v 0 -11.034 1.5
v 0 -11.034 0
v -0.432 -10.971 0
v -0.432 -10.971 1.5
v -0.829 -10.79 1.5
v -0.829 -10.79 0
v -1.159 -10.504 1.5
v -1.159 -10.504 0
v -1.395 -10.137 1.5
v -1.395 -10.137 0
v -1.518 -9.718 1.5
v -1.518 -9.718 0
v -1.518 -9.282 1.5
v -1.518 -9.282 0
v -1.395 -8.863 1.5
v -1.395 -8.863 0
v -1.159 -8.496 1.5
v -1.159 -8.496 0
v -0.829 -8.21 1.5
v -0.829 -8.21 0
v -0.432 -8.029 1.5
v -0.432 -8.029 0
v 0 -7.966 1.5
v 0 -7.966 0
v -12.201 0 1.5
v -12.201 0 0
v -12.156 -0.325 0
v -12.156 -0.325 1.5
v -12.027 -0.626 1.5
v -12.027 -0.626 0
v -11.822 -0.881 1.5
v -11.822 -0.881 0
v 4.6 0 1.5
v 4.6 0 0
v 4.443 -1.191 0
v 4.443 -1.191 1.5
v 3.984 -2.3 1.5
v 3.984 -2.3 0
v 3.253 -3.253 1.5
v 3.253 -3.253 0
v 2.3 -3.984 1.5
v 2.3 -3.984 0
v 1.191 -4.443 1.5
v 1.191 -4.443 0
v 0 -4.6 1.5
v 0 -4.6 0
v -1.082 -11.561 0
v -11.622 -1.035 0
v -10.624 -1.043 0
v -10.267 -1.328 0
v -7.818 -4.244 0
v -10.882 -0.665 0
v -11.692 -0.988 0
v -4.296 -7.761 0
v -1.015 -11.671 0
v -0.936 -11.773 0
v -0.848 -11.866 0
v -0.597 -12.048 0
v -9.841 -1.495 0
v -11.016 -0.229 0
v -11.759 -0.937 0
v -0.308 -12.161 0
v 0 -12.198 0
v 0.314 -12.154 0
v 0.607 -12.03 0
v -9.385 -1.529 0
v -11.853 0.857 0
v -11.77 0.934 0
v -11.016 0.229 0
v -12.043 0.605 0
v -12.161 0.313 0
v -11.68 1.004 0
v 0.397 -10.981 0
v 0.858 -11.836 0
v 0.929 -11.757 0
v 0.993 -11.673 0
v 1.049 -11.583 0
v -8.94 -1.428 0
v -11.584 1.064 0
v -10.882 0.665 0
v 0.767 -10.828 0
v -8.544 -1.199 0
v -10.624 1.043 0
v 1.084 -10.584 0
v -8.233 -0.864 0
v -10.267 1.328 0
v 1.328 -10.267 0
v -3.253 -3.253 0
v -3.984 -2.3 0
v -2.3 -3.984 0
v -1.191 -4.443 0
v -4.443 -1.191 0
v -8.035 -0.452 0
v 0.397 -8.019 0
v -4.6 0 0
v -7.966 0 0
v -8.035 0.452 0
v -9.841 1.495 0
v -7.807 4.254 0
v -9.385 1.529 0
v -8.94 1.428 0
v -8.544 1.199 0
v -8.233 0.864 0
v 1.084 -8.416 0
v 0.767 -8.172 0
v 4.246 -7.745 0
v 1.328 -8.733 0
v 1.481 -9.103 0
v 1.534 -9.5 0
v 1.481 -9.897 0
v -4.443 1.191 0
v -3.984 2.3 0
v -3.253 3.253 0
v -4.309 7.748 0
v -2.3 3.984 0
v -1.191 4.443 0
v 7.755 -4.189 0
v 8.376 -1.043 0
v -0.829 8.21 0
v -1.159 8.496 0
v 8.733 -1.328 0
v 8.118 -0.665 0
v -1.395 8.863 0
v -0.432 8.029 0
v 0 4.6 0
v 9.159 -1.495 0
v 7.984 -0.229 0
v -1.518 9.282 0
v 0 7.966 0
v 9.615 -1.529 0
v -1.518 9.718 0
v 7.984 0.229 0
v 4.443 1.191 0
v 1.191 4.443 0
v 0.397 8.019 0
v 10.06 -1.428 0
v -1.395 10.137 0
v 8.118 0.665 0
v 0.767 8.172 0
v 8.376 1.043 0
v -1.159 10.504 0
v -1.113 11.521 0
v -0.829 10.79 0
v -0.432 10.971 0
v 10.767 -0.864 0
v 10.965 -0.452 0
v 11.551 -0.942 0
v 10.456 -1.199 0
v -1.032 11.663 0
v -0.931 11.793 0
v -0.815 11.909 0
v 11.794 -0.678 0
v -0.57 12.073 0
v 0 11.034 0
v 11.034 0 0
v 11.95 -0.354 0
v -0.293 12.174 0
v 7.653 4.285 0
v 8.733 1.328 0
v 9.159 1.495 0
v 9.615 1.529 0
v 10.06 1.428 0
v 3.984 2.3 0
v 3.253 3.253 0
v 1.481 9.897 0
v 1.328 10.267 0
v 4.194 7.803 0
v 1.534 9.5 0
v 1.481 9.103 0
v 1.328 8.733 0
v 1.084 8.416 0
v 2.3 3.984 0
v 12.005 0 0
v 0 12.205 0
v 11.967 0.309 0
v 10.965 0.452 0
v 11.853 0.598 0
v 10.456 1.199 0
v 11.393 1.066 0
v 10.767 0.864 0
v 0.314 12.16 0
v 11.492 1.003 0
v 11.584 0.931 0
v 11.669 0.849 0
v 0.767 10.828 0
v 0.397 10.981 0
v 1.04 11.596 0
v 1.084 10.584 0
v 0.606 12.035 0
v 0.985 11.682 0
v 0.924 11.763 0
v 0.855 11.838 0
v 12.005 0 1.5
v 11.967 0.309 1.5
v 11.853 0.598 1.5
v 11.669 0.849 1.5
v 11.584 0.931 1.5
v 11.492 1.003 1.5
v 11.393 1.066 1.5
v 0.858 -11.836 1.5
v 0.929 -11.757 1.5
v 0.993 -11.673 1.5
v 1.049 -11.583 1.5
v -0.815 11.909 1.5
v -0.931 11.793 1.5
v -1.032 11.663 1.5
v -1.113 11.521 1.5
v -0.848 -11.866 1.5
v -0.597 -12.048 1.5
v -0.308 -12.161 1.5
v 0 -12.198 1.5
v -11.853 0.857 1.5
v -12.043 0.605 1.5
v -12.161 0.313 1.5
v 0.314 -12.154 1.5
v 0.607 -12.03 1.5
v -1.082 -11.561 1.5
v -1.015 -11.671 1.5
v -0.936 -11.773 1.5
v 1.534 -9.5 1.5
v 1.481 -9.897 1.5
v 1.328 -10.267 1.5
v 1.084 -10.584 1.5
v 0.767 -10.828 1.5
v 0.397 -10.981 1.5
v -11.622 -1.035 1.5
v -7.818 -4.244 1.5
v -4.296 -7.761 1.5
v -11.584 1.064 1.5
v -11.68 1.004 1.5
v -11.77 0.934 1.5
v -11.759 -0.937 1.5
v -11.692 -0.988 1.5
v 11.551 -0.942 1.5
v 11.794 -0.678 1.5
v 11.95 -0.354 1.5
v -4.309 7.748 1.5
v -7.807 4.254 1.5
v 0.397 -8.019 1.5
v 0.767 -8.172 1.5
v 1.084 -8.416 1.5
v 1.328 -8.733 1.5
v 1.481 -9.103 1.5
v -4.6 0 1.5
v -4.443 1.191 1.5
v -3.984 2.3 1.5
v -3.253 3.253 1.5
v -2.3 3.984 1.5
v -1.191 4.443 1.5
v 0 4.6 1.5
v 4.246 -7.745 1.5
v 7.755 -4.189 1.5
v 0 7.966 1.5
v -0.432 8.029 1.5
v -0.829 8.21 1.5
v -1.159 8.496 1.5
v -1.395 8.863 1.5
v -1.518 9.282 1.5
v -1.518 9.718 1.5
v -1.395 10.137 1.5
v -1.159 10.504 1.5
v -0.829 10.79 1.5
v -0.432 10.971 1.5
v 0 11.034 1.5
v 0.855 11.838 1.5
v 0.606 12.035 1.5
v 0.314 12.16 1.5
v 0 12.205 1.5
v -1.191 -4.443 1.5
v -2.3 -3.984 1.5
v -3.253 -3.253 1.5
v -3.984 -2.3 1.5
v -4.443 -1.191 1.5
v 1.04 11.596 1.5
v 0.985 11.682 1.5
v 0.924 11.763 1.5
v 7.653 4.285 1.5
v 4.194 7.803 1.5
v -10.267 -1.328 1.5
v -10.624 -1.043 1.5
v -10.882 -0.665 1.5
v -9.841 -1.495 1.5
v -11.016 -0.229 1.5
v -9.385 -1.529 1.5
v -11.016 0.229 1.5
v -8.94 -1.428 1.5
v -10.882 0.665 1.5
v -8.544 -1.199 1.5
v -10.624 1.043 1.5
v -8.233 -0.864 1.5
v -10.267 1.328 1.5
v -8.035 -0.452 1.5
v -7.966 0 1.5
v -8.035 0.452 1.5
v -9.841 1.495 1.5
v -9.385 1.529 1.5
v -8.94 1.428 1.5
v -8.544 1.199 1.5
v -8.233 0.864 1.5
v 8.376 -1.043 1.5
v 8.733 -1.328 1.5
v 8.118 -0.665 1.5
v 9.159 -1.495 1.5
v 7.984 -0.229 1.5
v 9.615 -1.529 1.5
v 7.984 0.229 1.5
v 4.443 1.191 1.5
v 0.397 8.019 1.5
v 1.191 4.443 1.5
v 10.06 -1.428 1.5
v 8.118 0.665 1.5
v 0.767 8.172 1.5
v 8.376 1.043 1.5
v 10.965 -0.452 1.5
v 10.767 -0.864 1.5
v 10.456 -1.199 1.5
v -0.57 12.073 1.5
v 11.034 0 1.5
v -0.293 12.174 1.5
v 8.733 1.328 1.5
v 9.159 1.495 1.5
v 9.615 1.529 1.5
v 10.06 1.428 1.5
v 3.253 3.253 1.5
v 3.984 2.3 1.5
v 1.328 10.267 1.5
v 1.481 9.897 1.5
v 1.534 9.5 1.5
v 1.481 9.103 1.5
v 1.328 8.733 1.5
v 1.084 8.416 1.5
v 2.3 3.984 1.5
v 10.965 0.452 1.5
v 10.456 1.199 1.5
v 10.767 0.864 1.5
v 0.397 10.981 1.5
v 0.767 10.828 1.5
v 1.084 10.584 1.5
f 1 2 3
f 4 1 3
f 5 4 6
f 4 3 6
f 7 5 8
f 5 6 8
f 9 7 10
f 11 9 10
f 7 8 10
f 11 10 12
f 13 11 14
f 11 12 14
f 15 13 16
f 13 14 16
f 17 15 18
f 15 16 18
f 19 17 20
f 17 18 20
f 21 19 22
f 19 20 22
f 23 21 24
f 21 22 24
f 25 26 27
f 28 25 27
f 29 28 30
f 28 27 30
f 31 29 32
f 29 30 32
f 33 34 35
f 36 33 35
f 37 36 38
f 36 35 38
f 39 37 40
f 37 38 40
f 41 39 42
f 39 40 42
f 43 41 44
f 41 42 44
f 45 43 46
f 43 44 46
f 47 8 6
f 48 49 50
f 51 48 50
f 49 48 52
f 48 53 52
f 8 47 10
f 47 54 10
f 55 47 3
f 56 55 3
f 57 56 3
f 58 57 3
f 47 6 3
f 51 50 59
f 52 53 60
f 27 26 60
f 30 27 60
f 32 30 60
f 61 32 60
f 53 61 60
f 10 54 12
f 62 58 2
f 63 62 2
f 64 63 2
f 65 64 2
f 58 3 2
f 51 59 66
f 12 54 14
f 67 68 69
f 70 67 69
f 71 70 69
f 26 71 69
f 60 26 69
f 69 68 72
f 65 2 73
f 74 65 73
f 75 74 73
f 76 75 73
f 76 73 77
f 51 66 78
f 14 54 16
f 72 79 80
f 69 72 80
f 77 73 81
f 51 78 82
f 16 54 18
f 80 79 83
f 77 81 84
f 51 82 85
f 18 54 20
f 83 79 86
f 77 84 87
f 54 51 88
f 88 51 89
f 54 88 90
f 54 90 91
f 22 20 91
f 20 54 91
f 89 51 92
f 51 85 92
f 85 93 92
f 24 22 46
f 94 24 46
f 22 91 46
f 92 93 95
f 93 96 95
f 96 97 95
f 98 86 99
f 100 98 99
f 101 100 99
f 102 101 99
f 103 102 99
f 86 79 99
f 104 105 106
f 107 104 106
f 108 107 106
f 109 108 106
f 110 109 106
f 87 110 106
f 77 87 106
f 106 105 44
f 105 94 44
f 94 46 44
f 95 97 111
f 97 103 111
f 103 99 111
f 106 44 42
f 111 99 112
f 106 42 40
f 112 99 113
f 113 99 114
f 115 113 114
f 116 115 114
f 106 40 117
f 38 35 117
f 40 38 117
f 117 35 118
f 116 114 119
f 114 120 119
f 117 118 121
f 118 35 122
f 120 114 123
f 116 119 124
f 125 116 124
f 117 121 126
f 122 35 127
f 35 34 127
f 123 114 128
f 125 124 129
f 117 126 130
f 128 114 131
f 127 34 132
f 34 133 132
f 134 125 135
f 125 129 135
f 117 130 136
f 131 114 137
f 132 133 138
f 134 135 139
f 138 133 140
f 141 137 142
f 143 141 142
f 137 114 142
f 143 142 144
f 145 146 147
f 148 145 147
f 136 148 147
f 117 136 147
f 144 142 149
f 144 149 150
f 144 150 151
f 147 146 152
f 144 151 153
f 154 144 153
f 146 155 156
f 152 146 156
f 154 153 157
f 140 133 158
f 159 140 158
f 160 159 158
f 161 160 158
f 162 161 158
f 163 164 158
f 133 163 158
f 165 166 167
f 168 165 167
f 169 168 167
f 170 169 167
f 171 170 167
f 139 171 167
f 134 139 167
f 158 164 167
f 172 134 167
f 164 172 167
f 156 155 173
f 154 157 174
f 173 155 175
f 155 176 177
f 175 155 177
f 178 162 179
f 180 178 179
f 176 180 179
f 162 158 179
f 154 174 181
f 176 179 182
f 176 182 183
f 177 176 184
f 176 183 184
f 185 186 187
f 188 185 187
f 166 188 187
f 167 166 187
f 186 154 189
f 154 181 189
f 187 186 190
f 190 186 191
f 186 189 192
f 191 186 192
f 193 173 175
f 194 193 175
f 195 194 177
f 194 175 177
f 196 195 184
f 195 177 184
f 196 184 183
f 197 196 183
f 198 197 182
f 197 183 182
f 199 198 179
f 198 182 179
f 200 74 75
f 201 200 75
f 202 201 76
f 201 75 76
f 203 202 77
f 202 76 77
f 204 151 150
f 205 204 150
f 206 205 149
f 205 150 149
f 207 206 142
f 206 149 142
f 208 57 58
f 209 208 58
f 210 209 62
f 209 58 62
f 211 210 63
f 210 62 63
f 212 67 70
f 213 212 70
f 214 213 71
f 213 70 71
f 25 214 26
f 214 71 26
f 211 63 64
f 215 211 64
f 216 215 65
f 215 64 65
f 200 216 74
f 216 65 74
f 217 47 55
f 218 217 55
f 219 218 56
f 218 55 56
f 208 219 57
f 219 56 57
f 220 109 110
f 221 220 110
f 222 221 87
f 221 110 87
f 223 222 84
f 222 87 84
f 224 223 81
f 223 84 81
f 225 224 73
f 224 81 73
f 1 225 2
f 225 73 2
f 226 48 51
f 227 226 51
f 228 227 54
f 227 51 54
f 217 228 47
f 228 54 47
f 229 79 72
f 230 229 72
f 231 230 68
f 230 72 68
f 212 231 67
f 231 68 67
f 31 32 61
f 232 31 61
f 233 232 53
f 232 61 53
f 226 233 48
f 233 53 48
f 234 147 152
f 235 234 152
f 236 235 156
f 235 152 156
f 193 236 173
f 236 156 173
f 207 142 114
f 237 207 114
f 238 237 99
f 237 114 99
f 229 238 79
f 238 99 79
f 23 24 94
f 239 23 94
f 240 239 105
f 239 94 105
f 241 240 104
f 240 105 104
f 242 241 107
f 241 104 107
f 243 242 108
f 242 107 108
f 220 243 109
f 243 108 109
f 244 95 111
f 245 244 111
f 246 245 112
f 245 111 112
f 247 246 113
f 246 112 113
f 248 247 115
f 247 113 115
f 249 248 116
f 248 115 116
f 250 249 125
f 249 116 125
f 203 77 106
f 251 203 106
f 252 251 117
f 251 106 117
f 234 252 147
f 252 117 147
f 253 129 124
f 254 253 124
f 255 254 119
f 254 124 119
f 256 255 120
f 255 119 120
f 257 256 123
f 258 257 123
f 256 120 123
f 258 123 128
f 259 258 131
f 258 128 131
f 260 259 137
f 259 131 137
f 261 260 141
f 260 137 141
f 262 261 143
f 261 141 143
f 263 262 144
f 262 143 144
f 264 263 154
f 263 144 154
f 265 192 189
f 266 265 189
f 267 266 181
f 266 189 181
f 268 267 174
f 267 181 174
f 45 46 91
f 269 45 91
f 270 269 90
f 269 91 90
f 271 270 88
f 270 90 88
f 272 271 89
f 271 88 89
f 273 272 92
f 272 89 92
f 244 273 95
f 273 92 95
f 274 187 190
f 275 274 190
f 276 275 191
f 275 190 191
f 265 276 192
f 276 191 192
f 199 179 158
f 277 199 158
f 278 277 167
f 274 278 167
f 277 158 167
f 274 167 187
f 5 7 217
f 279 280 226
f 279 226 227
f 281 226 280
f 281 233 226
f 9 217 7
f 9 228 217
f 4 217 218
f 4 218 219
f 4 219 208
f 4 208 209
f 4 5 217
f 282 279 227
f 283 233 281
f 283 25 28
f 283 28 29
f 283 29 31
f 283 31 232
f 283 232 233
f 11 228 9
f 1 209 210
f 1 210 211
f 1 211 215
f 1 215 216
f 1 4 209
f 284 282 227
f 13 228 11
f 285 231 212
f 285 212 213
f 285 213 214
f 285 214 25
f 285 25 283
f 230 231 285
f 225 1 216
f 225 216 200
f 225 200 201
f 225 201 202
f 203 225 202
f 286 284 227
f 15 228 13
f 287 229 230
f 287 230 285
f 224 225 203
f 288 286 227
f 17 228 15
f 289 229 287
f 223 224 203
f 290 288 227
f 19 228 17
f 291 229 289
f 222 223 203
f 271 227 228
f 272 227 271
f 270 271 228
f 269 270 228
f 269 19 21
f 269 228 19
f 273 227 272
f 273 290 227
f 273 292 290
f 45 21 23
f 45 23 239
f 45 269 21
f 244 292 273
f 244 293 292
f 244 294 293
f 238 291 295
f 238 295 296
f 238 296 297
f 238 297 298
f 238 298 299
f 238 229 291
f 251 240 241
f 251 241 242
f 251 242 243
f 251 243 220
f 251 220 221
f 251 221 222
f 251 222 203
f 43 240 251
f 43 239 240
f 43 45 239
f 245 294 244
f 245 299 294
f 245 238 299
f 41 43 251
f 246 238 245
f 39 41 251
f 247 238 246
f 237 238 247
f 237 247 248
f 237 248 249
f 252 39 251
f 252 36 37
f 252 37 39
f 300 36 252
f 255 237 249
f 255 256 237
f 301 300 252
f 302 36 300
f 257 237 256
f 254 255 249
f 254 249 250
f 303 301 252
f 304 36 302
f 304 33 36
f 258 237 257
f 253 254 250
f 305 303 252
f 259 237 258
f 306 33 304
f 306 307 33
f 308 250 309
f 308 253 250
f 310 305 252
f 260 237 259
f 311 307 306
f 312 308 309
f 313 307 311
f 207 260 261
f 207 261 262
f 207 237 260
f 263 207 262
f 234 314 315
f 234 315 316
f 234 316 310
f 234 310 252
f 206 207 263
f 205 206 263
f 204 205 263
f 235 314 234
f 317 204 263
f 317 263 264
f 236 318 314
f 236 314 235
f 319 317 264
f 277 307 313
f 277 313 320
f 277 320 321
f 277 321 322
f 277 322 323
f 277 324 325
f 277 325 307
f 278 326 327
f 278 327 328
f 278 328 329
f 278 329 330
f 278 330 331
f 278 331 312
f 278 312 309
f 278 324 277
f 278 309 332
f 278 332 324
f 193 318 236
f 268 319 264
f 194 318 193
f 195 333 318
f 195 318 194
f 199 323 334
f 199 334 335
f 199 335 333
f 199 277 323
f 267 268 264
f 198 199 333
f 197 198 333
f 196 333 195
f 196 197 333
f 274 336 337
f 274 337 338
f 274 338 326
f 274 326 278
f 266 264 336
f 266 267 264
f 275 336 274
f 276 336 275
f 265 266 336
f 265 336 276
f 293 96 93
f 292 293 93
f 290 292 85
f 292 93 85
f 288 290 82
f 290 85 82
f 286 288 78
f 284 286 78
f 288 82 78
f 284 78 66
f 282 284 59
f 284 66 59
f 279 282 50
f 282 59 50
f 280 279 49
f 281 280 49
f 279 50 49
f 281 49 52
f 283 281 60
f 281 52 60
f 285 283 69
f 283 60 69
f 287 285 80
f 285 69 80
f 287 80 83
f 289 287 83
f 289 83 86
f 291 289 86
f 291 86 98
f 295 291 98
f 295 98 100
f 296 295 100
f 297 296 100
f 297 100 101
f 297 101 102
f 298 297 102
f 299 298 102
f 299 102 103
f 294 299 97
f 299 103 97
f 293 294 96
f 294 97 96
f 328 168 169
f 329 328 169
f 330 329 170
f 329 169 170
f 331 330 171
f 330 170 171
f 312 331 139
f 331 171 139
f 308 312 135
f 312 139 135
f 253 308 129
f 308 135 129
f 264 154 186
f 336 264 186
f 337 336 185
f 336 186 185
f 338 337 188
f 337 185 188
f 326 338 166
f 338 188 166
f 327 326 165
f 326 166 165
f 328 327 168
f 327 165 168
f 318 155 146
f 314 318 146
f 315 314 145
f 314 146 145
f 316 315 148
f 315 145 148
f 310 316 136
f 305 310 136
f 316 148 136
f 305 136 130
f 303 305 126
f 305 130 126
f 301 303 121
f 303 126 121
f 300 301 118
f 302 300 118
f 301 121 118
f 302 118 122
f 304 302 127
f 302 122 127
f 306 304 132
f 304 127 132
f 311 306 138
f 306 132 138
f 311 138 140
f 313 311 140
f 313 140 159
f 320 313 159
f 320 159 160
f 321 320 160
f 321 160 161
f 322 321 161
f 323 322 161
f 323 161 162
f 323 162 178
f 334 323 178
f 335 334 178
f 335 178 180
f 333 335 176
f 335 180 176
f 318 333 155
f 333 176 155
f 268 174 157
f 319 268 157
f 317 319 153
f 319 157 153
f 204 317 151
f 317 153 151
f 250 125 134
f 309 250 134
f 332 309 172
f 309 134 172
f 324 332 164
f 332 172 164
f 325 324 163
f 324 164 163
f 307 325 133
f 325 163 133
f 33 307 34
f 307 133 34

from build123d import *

# Parameters (mm, degrees)
F1_DEPTH = 1.5


with BuildPart() as f1:
    # F0 (on Top) → F1 (new body)
    with BuildSketch(Plane.XY):
        with BuildLine():
            ThreePointArc((-11.0335932724, 0), (-9.5, 1.5335932724), (-7.9664067276, 0))
            Line((-7.9664067276, 0), (-4.6, 0))
            ThreePointArc((-4.6, 0), (-3.2526911935, 3.2526911935), (0, 4.6))
            Line((0, 4.6), (0, 7.9664067276))
            ThreePointArc((0, 7.9664067276), (-1.5335932724, 9.5), (0, 11.0335932724))
            Line((0, 11.0335932724), (0, 12.2052515495))
            ThreePointArc((0, 12.2052515495), (-0.4345010394, 12.1317339839), (-0.8145803081, 11.9087188829))
            ThreePointArc((-0.8145803081, 11.9087188829), (-0.9635912872, 11.7146325201), (-1.1134019503, 11.5211627464))
            ThreePointArc((-1.1134019503, 11.5211627464), (-6.0214332546, 5.9647454006), (-11.5844815273, 1.064231252))
            ThreePointArc((-11.5844815273, 1.064231252), (-11.7185491453, 0.9605716693), (-11.8529124882, 0.8572956927))
            ThreePointArc((-11.8529124882, 0.8572956927), (-12.1114910997, 0.4629412091), (-12.2012897293, 0))
            Line((-12.2012897293, 0), (-11.0335932724, 0))
        make_face()
        with BuildLine():
            Line((-4.6, 0), (-7.9664067276, 0))
            ThreePointArc((-7.9664067276, 0), (-9.5, -1.5335932724), (-11.0335932724, 0))
            Line((-11.0335932724, 0), (-12.2012897293, 0))
            ThreePointArc((-12.2012897293, 0), (-12.1017179659, -0.4794729938), (-11.8217098669, -0.8812245989))
            ThreePointArc((-11.8217098669, -0.8812245989), (-11.721781237, -0.9580802015), (-11.6220162383, -1.0351480919))
            ThreePointArc((-11.6220162383, -1.0351480919), (-6.0202525949, -5.9659244981), (-1.0822216309, -11.5612941984))
            ThreePointArc((-1.0822216309, -11.5612941984), (-0.9646757294, -11.7132260984), (-0.8476226636, -11.8655380184))
            ThreePointArc((-0.8476226636, -11.8655380184), (-0.4559625925, -12.1137220892), (0, -12.1979305118))
            Line((0, -12.1979305118), (0, -11.0335932724))
            ThreePointArc((0, -11.0335932724), (-1.5335932724, -9.5), (0, -7.9664067276))
            Line((0, -7.9664067276), (0, -4.6))
            ThreePointArc((0, -4.6), (-3.2526911935, -3.2526911935), (-4.6, 0))
        make_face()
        with BuildLine():
            Line((0, 7.9664067276), (0, 4.6))
            ThreePointArc((0, 4.6), (3.2526911935, 3.2526911935), (4.6, 0))
            Line((4.6, 0), (7.9664067276, 0))
            ThreePointArc((7.9664067276, 0), (9.5, 1.5335932724), (11.0335932724, 0))
            Line((11.0335932724, 0), (12.0049398392, 0))
            ThreePointArc((12.0049398392, 0), (11.9193137164, 0.4573515512), (11.6687643937, 0.849432297))
            ThreePointArc((11.6687643937, 0.849432297), (11.5305346329, 0.9577272788), (11.3926261985, 1.0664311591))
            ThreePointArc((11.3926261985, 1.0664311591), (5.8870136821, 6.0076850195), (1.0395559509, 11.5960579882))
            ThreePointArc((1.0395559509, 11.5960579882), (0.9473724033, 11.7171151321), (0.8554998188, 11.838408441))
            ThreePointArc((0.8554998188, 11.838408441), (0.4640913385, 12.1065803567), (0, 12.2052515495))
            Line((0, 12.2052515495), (0, 11.0335932724))
            ThreePointArc((0, 11.0335932724), (1.0844142025, 10.5844142025), (1.5335932724, 9.5))
            ThreePointArc((1.5335932724, 9.5), (1.0844142025, 8.4155857975), (0, 7.9664067276))
        make_face()
        with BuildLine():
            ThreePointArc((4.6, 0), (3.2526911935, -3.2526911935), (0, -4.6))
            Line((0, -4.6), (0, -7.9664067276))
            ThreePointArc((0, -7.9664067276), (1.0844142025, -8.4155857975), (1.5335932724, -9.5))
            ThreePointArc((1.5335932724, -9.5), (1.0844142025, -10.5844142025), (0, -11.0335932724))
            Line((0, -11.0335932724), (0, -12.1979305118))
            ThreePointArc((0, -12.1979305118), (0.4647348704, -12.1017306528), (0.8576533678, -11.8355578385))
            ThreePointArc((0.8576533678, -11.8355578385), (0.9532380505, -11.7093930262), (1.0491591917, -11.5834838282))
            ThreePointArc((1.0491591917, -11.5834838282), (5.9633685423, -5.9301704288), (11.5511297333, -0.9415502985))
            ThreePointArc((11.5511297333, -0.9415502985), (11.8839118623, -0.5218059727), (12.0049398392, 0))
            Line((12.0049398392, 0), (11.0335932724, 0))
            ThreePointArc((11.0335932724, 0), (9.5, -1.5335932724), (7.9664067276, 0))
            Line((7.9664067276, 0), (4.6, 0))
        make_face()
        with BuildLine():
            ThreePointArc((-11.5844815273, 1.064231252), (-11.7259145151, 0.970125819), (-11.8529124882, 0.8572956927))
            ThreePointArc((-11.8529124882, 0.8572956927), (-11.7185491453, 0.9605716693), (-11.5844815273, 1.064231252))
        make_face()
        with BuildLine():
            ThreePointArc((-11.6220162383, -1.0351480919), (-11.721781237, -0.9580802015), (-11.8217098669, -0.8812245989))
            ThreePointArc((-11.8217098669, -0.8812245989), (-11.7258479783, -0.9633562144), (-11.6220162383, -1.0351480919))
        make_face()
        with BuildLine():
            ThreePointArc((-0.8145803081, 11.9087188829), (-0.9836129307, 11.7300700266), (-1.1134019503, 11.5211627464))
            ThreePointArc((-1.1134019503, 11.5211627464), (-0.9635912872, 11.7146325201), (-0.8145803081, 11.9087188829))
        make_face()
        with BuildLine():
            ThreePointArc((-0.8476226636, -11.8655380184), (-0.9646757294, -11.7132260984), (-1.0822216309, -11.5612941984))
            ThreePointArc((-1.0822216309, -11.5612941984), (-0.9769671574, -11.7227038795), (-0.8476226636, -11.8655380184))
        make_face()
        with BuildLine():
            ThreePointArc((1.0395559509, 11.5960579882), (0.9551101208, 11.72299164), (0.8554998188, 11.838408441))
            ThreePointArc((0.8554998188, 11.838408441), (0.9473724033, 11.7171151321), (1.0395559509, 11.5960579882))
        make_face()
        with BuildLine():
            ThreePointArc((1.0491591917, -11.5834838282), (0.9532380505, -11.7093930262), (0.8576533678, -11.8355578385))
            ThreePointArc((0.8576533678, -11.8355578385), (0.9616128176, -11.7157555094), (1.0491591917, -11.5834838282))
        make_face()
        with BuildLine():
            ThreePointArc((11.3926261985, 1.0664311591), (11.5305346329, 0.9577272788), (11.6687643937, 0.849432297))
            ThreePointArc((11.6687643937, 0.849432297), (11.5385404595, 0.9679149567), (11.3926261985, 1.0664311591))
        make_face()
    extrude(amount=F1_DEPTH)


solid = f1.part
